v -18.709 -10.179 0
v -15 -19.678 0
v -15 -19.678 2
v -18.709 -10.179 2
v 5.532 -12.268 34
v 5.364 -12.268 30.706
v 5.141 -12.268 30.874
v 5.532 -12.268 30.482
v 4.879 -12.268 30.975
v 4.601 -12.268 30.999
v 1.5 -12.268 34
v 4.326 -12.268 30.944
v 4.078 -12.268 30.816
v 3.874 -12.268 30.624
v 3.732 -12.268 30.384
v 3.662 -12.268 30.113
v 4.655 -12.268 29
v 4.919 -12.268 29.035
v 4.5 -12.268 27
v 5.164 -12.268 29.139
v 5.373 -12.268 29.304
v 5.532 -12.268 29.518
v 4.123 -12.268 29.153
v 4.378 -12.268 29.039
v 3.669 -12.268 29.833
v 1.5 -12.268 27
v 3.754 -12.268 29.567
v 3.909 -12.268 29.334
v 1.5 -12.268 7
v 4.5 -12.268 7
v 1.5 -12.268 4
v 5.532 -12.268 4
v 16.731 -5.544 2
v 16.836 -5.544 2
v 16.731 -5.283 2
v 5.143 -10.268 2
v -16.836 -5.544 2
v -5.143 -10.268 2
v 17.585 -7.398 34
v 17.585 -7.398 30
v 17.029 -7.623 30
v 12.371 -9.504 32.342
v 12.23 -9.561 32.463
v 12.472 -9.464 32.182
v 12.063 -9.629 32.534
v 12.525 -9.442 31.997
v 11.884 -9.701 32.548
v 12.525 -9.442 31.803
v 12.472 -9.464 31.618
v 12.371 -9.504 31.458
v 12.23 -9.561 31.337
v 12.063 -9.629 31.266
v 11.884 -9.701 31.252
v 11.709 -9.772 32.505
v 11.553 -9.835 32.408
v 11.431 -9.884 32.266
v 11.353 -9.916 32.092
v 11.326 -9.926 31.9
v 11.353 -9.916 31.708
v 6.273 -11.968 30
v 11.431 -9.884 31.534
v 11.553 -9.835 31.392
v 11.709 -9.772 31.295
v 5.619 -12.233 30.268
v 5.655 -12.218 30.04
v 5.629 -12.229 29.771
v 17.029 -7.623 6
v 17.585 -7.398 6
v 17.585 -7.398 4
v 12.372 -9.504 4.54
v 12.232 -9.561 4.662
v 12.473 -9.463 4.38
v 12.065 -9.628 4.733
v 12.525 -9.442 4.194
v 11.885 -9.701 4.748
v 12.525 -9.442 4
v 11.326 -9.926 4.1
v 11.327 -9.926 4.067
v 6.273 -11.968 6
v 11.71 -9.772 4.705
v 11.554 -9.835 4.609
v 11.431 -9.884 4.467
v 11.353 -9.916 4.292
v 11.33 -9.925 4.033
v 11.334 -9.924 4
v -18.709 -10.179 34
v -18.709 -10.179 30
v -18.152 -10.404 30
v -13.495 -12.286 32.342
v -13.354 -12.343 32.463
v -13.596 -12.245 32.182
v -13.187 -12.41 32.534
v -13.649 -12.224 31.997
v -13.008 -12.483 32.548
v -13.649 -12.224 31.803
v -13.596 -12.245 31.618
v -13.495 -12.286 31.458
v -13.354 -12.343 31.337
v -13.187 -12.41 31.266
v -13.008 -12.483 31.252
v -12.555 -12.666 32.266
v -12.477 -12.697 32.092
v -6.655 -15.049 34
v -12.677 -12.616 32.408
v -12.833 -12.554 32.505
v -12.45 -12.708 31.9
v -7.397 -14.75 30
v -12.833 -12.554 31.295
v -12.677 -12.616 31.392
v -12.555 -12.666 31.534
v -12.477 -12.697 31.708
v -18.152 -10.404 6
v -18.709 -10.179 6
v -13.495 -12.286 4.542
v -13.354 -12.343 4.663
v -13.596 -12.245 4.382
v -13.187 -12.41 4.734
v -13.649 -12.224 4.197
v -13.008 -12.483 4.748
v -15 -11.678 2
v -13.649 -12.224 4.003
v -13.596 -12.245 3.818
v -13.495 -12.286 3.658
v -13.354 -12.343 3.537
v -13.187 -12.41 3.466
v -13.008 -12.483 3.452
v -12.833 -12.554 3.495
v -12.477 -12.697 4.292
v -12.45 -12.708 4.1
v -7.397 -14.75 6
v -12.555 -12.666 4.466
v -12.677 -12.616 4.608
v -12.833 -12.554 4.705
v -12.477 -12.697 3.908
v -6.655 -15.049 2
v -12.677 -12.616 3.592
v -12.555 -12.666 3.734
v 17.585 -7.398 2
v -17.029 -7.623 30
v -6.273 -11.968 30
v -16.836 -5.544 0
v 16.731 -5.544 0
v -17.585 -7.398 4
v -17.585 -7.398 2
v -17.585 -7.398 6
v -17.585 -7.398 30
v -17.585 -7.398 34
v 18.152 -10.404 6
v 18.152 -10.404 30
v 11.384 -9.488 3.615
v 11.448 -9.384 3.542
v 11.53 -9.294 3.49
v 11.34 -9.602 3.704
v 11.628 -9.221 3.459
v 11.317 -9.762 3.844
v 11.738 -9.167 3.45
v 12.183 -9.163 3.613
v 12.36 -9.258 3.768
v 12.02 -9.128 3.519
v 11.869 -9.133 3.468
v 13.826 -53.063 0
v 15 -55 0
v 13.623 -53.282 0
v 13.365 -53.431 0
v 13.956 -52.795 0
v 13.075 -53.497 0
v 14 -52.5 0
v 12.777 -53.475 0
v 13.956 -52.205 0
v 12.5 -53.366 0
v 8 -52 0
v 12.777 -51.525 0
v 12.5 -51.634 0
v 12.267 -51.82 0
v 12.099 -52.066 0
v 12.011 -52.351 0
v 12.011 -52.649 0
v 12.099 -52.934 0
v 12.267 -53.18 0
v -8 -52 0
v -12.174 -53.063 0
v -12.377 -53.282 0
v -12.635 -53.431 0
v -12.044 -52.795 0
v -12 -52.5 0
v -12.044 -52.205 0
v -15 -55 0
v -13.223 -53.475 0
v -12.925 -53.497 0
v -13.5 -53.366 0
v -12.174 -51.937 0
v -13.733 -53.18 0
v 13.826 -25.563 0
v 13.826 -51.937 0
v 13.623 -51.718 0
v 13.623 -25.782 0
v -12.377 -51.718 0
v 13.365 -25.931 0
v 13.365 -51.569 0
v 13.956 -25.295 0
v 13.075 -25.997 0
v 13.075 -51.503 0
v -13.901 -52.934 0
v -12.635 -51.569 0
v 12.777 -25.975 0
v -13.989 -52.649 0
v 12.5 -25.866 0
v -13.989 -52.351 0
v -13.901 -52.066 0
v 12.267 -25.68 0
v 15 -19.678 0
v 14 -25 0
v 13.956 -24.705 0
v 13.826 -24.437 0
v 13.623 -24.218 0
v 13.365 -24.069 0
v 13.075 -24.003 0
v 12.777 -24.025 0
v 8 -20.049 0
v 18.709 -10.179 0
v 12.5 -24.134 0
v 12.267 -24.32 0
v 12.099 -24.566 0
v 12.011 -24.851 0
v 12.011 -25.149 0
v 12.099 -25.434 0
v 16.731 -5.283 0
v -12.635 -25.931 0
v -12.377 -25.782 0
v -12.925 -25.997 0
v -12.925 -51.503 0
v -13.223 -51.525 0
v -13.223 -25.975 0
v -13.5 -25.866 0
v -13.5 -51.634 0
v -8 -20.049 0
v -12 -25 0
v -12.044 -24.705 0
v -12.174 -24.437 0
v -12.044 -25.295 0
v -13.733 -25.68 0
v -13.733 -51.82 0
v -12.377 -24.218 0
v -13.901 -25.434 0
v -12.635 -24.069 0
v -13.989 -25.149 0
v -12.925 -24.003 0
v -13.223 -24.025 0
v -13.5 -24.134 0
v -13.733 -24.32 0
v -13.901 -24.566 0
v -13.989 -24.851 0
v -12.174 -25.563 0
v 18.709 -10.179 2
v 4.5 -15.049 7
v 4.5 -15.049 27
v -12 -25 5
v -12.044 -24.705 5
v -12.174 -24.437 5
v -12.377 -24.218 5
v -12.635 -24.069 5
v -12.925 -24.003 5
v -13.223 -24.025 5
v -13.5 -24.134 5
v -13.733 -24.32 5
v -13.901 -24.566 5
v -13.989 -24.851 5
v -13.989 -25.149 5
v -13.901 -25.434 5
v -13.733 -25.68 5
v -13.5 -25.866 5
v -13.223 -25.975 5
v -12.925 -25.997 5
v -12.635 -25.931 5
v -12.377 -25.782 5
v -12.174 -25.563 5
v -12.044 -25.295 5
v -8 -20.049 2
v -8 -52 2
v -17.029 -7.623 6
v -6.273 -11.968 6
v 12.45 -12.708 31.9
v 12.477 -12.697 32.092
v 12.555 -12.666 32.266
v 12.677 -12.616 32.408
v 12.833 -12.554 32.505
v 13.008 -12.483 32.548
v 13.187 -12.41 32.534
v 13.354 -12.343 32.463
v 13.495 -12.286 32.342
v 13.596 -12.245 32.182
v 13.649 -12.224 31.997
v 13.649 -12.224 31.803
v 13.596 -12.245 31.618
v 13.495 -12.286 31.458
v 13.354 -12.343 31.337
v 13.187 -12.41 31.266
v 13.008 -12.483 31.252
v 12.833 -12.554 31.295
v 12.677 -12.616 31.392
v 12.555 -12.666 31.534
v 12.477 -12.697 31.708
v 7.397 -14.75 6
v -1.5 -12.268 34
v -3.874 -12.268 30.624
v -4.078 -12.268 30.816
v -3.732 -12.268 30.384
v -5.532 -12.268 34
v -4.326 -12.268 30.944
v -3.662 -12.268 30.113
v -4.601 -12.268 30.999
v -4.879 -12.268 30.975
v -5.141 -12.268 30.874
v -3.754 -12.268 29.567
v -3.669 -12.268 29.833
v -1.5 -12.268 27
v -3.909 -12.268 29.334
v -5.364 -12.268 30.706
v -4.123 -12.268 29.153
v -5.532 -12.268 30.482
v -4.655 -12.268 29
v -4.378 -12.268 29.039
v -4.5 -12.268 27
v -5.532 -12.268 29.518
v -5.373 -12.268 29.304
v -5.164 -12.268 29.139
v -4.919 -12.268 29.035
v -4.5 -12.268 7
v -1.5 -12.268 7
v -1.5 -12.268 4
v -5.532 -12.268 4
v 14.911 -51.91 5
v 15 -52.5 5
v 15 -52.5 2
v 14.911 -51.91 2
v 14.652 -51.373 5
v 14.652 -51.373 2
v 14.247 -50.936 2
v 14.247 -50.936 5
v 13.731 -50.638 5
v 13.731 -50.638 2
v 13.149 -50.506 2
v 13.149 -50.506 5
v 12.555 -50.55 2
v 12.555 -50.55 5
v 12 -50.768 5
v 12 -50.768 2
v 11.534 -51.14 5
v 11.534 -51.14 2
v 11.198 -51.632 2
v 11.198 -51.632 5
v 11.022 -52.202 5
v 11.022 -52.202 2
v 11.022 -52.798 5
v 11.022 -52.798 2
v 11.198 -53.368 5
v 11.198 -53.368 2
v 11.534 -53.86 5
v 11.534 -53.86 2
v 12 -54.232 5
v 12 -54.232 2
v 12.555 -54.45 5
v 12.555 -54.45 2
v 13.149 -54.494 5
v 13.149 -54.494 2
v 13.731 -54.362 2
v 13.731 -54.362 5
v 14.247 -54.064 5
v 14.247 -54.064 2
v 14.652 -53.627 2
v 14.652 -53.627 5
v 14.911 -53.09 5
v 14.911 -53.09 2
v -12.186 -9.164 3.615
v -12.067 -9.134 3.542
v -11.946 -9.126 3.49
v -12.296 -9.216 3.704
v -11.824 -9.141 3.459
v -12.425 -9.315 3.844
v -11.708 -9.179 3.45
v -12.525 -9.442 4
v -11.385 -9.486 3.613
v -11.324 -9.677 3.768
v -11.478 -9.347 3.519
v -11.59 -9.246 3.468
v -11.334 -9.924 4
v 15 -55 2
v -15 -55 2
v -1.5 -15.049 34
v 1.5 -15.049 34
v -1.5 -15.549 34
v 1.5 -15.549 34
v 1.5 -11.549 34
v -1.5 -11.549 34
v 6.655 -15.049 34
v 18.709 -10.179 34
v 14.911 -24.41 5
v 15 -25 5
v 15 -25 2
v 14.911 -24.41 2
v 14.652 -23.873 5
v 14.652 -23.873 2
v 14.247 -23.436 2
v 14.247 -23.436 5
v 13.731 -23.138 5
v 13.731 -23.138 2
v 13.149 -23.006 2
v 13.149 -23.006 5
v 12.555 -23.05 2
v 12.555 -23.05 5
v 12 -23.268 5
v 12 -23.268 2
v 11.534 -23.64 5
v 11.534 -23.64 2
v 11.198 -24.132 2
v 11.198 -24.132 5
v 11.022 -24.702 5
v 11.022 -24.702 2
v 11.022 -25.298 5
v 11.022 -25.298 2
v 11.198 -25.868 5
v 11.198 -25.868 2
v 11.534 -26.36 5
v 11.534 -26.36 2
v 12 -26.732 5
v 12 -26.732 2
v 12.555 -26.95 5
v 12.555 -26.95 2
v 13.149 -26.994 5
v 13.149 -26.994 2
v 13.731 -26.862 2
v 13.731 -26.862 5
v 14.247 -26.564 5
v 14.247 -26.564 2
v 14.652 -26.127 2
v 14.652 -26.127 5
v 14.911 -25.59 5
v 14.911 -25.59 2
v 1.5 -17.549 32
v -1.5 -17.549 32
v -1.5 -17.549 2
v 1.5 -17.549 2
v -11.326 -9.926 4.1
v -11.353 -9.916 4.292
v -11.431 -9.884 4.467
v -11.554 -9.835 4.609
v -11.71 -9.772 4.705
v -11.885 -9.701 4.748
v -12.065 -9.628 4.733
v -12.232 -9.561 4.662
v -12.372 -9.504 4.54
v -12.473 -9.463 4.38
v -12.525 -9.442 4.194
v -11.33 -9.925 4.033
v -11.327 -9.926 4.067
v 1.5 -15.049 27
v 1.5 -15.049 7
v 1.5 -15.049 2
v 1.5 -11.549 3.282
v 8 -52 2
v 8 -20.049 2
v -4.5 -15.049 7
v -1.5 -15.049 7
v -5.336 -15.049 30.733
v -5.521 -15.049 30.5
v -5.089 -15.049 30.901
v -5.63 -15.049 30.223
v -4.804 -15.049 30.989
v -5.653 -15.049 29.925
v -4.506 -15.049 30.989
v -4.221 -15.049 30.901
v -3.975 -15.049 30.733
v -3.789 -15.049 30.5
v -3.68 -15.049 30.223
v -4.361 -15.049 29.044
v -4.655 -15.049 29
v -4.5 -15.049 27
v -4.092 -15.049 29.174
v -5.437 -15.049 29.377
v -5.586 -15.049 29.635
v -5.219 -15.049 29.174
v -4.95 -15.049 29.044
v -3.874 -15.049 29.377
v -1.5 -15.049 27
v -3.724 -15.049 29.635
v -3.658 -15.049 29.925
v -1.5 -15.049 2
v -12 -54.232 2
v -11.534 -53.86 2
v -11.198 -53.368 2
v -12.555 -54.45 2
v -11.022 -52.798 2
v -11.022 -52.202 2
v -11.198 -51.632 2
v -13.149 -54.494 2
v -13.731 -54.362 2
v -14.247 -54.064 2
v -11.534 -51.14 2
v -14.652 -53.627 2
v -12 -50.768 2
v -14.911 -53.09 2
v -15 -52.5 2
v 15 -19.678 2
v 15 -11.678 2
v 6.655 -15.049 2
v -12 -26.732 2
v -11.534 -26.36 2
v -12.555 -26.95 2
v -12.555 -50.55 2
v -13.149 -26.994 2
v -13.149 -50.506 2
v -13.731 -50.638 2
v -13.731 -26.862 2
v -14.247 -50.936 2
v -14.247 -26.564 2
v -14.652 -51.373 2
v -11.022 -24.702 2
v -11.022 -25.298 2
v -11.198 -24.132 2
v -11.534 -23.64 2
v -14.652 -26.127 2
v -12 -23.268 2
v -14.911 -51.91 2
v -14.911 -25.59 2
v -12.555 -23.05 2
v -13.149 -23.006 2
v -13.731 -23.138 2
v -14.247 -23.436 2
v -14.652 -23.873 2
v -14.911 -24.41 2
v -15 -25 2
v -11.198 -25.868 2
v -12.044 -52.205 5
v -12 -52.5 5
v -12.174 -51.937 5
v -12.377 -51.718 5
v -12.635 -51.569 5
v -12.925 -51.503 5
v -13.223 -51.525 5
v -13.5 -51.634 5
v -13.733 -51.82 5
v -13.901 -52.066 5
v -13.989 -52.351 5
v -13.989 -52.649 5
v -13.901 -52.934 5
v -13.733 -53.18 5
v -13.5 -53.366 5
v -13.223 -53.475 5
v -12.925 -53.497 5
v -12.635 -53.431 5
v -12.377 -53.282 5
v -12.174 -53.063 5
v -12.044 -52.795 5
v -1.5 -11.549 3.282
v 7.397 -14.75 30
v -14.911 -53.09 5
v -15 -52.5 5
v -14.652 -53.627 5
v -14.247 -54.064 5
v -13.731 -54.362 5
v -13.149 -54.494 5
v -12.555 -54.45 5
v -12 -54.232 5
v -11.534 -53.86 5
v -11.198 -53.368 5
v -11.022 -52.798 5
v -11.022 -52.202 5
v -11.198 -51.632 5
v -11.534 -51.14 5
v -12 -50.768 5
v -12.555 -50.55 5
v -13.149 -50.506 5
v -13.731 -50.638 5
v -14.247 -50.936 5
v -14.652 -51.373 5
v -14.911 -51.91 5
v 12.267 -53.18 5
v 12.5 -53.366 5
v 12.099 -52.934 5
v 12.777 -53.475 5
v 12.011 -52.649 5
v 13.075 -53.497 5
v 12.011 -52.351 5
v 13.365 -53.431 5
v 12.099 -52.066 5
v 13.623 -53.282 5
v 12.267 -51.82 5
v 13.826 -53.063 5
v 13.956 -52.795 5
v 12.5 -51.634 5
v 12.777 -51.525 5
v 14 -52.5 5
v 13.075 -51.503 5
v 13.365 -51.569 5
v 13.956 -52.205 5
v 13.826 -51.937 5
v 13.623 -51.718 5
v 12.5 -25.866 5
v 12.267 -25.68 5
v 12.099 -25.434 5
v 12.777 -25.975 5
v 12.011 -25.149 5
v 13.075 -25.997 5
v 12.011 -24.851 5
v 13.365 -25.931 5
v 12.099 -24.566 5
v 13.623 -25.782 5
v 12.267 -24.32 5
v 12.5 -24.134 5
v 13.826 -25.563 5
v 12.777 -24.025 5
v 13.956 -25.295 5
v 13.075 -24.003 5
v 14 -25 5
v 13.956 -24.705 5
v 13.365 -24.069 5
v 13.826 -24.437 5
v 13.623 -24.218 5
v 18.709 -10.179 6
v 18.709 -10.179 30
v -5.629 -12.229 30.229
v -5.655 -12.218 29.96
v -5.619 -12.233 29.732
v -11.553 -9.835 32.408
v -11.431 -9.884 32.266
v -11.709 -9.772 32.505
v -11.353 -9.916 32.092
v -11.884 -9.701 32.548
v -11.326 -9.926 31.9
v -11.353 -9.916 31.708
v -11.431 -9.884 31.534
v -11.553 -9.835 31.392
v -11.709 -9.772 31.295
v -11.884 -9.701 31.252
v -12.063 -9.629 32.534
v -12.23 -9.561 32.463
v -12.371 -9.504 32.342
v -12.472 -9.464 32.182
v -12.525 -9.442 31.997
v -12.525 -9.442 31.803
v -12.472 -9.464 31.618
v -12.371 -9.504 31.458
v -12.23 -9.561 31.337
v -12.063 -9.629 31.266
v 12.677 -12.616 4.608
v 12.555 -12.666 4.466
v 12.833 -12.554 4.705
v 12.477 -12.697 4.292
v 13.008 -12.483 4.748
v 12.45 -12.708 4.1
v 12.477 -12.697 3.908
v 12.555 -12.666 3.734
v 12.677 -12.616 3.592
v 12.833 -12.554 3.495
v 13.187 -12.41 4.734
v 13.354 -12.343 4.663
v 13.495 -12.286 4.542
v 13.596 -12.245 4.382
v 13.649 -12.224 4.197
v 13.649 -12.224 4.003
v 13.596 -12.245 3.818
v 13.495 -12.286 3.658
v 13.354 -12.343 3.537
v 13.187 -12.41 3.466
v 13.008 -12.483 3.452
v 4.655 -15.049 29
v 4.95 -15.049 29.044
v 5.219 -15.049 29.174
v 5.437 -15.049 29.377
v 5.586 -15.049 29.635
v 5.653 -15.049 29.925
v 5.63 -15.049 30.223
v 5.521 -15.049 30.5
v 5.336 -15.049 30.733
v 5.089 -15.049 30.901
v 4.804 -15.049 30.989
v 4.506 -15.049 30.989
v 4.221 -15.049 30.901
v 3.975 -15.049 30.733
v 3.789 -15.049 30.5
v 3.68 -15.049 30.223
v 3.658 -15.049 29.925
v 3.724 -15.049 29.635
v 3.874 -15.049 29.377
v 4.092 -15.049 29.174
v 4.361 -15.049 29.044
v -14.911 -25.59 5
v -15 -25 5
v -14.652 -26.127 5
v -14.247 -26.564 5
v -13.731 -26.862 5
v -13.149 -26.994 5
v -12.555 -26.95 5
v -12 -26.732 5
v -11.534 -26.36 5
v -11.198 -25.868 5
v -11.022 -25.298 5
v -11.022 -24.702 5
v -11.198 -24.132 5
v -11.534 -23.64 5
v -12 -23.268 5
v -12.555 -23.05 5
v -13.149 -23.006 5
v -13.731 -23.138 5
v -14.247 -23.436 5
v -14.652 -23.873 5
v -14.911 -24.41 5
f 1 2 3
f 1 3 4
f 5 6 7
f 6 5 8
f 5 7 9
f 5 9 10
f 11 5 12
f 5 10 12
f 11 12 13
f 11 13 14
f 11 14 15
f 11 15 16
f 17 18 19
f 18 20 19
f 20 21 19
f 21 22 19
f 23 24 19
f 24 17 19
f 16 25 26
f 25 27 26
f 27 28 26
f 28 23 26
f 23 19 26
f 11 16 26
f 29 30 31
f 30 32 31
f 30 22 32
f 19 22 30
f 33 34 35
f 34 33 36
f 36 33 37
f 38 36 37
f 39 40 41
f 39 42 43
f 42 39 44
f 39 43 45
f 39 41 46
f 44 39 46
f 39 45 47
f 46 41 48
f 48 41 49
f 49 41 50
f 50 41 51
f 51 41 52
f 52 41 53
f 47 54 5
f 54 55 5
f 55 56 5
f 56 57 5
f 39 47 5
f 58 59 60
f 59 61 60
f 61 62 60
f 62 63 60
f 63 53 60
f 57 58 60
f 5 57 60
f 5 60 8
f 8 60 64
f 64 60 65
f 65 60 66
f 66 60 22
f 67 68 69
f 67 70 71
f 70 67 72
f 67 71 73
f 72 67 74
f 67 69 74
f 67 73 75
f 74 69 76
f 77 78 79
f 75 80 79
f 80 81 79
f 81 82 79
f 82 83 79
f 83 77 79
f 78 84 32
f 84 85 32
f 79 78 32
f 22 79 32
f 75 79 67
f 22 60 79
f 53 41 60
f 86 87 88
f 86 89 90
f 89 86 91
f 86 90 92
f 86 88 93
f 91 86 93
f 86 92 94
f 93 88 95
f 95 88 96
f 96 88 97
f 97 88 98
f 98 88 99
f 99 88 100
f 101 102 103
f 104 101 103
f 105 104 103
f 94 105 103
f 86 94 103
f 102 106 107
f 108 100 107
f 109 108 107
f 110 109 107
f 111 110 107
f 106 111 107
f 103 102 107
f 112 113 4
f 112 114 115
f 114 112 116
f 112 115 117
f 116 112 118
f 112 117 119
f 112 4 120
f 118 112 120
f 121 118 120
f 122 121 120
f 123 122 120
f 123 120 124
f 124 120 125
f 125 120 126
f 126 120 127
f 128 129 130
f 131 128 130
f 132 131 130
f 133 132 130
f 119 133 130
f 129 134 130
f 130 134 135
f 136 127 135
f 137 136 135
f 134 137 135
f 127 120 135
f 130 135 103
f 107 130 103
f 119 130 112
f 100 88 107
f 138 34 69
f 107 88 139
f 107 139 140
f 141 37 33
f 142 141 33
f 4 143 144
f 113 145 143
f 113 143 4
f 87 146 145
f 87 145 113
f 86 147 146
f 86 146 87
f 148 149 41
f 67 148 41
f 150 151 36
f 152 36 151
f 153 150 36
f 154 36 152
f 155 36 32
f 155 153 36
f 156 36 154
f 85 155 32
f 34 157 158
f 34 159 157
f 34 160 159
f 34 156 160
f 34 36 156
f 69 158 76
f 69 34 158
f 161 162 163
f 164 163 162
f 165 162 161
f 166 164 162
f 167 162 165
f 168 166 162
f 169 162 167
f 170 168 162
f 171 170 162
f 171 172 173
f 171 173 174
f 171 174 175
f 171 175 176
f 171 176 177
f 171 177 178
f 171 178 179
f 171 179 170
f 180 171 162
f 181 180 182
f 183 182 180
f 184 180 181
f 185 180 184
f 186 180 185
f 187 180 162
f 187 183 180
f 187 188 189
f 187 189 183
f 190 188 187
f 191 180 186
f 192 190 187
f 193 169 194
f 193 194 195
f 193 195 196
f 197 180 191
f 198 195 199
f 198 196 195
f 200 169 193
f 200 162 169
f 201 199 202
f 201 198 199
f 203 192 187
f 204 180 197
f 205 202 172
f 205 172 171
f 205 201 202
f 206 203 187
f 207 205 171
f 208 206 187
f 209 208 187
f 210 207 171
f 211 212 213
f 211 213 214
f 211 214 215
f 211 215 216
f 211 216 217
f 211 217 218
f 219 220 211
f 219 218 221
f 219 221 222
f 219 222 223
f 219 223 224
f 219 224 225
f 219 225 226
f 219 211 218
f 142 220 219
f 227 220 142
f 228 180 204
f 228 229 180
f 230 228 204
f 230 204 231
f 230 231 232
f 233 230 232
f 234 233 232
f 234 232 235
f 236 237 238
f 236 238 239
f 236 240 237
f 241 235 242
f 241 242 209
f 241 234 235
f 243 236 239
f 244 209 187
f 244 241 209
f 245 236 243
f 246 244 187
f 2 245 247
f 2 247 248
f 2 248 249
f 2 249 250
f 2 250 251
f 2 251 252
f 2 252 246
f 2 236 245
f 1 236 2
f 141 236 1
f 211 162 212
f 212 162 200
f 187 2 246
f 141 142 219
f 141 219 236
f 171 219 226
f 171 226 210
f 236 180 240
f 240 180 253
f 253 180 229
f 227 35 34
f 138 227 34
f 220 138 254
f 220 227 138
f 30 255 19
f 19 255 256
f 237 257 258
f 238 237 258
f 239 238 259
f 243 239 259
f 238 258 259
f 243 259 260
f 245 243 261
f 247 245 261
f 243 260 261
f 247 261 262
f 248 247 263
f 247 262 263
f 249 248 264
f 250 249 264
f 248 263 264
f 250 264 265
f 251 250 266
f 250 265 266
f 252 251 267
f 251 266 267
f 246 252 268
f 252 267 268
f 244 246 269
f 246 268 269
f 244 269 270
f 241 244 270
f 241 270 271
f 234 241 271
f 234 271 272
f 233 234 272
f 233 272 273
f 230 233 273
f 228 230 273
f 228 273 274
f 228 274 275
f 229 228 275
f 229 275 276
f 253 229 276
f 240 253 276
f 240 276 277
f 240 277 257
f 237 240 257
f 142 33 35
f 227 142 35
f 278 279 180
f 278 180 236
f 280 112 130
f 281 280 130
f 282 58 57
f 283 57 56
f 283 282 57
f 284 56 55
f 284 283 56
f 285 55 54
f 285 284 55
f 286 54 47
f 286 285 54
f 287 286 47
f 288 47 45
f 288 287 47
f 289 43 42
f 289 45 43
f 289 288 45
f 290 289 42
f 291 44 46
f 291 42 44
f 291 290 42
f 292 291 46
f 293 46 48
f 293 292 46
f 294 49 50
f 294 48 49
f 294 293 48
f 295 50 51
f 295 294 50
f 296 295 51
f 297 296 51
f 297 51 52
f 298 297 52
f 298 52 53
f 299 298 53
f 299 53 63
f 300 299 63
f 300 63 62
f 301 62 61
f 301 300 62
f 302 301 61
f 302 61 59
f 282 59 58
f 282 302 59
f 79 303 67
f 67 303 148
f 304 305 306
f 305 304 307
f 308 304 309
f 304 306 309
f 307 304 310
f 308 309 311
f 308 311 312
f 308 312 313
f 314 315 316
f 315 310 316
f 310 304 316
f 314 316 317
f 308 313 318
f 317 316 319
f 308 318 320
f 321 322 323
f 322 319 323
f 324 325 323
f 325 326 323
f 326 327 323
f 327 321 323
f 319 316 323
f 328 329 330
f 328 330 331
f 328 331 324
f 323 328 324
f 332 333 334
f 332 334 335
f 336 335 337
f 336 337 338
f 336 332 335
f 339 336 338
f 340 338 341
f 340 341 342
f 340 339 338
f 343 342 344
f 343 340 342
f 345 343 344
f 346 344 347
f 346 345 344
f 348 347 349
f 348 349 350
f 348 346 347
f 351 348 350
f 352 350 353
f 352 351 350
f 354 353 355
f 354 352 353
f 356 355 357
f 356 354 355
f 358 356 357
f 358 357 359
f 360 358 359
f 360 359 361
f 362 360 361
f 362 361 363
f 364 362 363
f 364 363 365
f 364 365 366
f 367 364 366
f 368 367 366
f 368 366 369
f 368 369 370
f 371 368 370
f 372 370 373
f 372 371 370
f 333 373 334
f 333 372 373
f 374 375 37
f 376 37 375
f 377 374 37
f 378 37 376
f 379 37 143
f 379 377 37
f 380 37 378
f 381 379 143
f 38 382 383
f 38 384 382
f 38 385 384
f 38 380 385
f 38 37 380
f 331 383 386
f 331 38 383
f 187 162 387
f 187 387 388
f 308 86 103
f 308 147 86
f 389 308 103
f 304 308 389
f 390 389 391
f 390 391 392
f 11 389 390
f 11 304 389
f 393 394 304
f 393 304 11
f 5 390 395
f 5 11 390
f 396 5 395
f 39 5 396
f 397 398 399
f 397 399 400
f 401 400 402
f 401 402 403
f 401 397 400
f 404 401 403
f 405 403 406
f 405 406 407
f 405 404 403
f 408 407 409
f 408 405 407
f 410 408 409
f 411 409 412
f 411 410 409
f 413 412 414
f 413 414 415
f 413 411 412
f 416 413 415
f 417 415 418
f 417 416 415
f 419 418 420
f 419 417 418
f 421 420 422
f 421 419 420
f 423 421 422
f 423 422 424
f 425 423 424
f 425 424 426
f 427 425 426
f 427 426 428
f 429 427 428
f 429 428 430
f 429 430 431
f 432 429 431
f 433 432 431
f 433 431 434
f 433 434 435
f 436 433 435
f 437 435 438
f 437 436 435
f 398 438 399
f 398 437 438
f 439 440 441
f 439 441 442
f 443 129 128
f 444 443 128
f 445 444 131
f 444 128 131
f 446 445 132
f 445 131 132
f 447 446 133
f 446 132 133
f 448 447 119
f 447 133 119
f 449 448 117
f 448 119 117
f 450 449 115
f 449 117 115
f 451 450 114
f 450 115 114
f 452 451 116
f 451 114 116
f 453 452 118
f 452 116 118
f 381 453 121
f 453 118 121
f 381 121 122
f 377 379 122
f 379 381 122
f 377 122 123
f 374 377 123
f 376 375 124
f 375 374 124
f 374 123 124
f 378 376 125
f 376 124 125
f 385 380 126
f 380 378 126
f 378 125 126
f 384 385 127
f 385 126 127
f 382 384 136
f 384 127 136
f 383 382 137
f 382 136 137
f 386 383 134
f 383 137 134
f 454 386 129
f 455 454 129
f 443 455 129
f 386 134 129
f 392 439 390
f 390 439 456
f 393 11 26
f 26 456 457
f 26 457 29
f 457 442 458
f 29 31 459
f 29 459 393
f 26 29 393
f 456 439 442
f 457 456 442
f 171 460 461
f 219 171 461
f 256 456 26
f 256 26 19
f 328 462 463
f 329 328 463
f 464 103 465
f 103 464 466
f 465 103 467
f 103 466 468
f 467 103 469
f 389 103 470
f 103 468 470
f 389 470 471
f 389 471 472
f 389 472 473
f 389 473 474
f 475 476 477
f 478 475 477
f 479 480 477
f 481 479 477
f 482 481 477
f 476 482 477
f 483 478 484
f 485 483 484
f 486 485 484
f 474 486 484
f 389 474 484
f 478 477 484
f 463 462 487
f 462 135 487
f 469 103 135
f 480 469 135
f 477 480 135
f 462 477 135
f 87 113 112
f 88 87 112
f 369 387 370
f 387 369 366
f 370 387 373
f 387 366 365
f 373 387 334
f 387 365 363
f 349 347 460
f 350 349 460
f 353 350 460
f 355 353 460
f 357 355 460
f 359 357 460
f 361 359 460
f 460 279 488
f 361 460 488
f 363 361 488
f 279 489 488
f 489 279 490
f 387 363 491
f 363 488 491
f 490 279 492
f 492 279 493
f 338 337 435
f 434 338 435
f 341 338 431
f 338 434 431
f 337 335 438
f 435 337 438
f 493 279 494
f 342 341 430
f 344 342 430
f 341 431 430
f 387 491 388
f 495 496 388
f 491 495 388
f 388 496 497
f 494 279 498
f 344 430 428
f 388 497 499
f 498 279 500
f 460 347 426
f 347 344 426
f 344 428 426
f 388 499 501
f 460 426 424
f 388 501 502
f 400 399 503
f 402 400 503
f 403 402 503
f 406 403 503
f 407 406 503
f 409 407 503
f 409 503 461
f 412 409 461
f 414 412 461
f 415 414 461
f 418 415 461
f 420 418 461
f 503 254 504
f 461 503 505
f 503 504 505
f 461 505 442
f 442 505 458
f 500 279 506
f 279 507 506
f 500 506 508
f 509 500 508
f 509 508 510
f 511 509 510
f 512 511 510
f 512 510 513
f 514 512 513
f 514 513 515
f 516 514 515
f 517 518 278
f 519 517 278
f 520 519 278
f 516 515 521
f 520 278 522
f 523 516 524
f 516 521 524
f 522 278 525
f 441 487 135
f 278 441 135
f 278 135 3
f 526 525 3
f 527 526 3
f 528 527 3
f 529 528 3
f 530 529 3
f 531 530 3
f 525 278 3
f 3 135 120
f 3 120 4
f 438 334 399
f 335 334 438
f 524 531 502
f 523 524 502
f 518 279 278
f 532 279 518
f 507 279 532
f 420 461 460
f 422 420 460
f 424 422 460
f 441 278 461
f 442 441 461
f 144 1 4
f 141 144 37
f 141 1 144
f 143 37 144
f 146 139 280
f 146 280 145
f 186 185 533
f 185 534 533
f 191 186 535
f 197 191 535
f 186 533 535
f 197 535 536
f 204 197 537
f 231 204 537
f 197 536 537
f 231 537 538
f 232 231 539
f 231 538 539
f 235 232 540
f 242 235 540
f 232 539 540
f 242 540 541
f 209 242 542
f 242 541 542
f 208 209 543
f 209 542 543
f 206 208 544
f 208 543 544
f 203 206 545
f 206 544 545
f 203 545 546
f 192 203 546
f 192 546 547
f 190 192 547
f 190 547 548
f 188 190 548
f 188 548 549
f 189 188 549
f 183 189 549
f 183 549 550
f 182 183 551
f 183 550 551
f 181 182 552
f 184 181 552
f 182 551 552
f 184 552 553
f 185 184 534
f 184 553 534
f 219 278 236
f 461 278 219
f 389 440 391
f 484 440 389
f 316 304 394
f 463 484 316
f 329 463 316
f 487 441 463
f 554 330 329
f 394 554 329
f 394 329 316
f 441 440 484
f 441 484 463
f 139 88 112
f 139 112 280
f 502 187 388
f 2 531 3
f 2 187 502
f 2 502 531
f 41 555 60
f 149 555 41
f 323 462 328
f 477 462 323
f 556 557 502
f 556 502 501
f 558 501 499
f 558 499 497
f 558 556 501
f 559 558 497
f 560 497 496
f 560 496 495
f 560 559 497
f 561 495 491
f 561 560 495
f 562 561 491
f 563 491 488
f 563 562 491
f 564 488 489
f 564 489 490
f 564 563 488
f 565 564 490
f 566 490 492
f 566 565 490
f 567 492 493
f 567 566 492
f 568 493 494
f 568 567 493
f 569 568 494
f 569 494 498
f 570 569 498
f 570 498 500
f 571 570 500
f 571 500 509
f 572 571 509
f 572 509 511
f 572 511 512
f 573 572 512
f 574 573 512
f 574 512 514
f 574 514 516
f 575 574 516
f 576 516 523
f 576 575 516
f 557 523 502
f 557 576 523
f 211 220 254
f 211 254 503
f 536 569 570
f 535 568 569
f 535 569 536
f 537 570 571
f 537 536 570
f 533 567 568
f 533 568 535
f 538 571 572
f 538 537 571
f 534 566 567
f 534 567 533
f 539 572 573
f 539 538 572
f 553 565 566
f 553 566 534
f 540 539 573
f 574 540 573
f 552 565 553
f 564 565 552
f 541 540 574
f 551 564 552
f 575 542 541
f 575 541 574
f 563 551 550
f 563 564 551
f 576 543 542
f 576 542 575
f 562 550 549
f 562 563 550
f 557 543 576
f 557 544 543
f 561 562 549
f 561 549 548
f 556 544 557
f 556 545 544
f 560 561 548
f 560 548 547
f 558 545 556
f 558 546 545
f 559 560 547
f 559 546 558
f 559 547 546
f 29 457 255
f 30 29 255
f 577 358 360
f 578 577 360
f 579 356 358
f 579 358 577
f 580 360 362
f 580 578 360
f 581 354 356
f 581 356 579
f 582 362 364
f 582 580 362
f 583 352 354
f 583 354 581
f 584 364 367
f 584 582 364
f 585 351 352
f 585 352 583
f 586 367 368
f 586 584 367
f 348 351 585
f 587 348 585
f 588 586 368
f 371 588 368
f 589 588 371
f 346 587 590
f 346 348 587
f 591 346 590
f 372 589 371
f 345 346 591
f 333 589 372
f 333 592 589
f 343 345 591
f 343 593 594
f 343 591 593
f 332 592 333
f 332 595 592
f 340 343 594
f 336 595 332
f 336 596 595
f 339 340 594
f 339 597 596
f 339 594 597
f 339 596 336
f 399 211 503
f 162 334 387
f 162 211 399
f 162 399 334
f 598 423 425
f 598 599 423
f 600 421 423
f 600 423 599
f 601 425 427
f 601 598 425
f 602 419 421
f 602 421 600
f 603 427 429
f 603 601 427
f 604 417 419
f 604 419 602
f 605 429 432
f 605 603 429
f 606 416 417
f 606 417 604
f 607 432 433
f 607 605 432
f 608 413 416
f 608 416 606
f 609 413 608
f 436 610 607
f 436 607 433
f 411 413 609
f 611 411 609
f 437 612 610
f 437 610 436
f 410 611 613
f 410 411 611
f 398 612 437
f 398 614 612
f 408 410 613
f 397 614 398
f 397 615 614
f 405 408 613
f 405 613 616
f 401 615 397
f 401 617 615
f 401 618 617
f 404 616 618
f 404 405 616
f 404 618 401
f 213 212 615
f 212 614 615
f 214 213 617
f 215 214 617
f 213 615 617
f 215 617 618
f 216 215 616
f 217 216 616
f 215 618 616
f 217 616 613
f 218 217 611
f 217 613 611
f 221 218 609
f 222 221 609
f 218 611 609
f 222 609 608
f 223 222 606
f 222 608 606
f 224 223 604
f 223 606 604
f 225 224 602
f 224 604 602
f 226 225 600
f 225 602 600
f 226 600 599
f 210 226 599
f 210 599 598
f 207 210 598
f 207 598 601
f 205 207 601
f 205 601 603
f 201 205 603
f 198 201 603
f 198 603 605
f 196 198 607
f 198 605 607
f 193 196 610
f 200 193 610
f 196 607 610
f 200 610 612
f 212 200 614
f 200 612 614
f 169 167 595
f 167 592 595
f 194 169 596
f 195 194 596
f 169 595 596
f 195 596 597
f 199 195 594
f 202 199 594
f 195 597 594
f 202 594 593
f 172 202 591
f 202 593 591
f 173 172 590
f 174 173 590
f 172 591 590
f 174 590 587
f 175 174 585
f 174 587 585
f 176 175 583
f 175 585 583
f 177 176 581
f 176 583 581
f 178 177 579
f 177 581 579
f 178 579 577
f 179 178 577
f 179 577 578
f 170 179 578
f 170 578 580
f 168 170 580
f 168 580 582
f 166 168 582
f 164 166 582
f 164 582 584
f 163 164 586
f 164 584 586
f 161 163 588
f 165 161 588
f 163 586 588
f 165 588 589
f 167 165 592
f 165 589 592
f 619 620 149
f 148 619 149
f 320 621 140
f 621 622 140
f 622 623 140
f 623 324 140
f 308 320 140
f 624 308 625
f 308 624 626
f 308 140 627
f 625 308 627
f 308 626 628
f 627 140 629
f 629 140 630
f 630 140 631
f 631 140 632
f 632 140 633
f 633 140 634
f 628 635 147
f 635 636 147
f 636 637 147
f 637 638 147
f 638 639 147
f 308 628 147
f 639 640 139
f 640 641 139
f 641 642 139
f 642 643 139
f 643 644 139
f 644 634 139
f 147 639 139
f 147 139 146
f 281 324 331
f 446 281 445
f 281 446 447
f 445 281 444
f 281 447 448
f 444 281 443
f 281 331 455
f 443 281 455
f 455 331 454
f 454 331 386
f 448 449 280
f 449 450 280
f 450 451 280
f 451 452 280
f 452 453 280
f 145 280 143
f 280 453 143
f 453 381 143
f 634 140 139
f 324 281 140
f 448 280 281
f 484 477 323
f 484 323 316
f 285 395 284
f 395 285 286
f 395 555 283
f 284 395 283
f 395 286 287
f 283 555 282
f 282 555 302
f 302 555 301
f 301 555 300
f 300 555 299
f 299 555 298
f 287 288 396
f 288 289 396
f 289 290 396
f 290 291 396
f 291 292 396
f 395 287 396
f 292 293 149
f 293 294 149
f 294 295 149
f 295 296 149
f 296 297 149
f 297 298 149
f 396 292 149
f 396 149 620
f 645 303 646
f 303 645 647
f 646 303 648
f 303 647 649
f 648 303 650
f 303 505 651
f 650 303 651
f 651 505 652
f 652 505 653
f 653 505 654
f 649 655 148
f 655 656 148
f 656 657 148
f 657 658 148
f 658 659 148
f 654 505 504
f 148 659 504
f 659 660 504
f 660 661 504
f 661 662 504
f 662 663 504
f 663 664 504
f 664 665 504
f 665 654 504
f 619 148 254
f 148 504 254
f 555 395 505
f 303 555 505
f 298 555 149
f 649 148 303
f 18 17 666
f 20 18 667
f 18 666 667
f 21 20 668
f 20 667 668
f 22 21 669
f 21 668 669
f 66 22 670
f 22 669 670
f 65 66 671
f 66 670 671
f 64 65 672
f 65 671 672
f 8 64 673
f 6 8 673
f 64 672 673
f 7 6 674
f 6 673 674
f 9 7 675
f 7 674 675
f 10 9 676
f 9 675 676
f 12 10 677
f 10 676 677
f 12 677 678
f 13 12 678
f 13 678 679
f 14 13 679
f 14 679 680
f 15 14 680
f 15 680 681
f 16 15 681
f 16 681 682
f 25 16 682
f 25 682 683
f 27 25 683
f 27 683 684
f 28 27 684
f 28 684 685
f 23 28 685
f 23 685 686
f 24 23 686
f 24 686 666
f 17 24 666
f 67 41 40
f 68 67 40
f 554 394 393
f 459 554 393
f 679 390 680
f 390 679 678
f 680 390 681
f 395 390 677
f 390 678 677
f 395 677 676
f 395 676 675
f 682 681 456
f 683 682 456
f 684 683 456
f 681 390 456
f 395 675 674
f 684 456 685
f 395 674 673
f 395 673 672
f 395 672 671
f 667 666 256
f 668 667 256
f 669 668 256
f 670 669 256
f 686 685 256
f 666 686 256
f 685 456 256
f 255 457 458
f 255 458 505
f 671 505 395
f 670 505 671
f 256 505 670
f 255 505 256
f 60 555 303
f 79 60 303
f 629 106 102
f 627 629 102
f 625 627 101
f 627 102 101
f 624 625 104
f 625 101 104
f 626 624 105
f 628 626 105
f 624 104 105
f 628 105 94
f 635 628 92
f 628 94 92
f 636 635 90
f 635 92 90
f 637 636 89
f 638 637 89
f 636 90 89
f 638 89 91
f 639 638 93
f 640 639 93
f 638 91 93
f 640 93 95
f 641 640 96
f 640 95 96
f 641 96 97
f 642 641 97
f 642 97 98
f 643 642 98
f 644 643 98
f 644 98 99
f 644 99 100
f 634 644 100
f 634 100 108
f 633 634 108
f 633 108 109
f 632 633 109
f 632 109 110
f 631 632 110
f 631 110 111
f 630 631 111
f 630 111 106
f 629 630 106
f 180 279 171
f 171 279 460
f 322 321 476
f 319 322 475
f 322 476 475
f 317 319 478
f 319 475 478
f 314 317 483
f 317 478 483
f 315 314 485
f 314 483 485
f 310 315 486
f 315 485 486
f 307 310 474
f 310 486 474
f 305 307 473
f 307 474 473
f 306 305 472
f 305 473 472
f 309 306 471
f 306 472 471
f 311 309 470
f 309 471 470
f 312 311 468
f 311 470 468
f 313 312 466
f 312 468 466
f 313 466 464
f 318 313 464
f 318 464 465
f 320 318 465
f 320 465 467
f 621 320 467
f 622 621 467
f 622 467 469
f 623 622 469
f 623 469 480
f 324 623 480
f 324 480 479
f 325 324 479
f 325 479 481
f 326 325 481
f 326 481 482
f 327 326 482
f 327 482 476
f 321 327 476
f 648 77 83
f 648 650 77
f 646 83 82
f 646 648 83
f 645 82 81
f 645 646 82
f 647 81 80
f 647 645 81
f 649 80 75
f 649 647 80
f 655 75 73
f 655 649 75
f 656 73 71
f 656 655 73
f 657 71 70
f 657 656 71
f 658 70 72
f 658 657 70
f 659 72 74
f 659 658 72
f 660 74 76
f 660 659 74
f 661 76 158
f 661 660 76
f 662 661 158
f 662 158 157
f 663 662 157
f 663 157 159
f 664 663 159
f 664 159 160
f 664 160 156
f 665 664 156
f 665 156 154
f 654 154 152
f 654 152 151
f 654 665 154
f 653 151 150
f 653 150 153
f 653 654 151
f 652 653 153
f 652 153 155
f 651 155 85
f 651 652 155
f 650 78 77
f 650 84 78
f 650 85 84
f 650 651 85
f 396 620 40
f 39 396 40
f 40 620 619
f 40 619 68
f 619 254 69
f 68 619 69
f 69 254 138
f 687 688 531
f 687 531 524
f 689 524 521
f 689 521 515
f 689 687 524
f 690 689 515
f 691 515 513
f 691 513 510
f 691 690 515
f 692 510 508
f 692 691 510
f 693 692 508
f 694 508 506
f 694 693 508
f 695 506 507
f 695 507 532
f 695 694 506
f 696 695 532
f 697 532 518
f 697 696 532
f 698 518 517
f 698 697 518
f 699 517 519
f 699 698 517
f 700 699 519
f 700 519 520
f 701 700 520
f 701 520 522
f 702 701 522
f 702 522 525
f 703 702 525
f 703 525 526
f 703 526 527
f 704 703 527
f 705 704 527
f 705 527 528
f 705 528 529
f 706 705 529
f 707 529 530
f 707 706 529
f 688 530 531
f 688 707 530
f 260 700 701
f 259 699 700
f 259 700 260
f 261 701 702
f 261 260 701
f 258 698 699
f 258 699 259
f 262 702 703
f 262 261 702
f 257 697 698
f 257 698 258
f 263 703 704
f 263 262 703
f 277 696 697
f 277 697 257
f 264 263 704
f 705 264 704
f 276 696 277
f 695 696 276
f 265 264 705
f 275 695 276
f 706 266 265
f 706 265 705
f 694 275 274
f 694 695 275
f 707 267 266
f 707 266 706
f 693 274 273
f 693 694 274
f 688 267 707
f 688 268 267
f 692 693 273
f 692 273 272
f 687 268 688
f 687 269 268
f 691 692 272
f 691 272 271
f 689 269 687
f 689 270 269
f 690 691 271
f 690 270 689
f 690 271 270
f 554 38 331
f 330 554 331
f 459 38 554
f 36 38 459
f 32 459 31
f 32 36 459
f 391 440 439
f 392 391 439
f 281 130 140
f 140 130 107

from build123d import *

# Parameters (mm, degrees)
EXTRUDE_1_DEPTH      = 2
EXTRUDE_2_DEPTH      = 32
EXTRUDE_2_DEPTH_BACK = 2
CUT_EXTRUDE_5_REACH  = 59.048
SKETCH_3_R           = 0.65
SKETCH_3_W           = 12.2
SKETCH_3_H           = 24
CUT_EXTRUDE_7_REACH  = 59.919
SKETCH_12_R          = 0.65
SKETCH_12_W          = 12.2
SKETCH_12_H          = 24
CUT_EXTRUDE_8_REACH  = 68.325
SKETCH_13_R          = 1
SKETCH_13_W          = 16
SKETCH_13_H          = 31.950672009
CHAMFER_4_SIZE       = 1
CHAMFER_5_SIZE       = 2
EXTRUDE_START        = -32
SKETCH_14_W          = 3
SKETCH_14_H          = 6
EXTRUDE_8_DEPTH      = 32
CHAMFER_6_SIZE       = 2
EXTRUDE_START_2      = 3
SKETCH_15_R          = 2
SKETCH_15_R_2        = 1
EXTRUDE_9_DEPTH      = 3
CUT_EXTRUDE_9_REACH  = 57.696
SKETCH_16_W          = 3
SKETCH_16_H          = 20
EXTRUDE_10_DEPTH     = 2
EXTRUDE_11_DEPTH     = 28
CUT_EXTRUDE_10_REACH = 55.931
SKETCH_19_R          = 1
CUT_EXTRUDE_11_REACH = 68.325
SKETCH_20_W          = 33.566306147
SKETCH_20_H          = 6.687524296


# Some blends are built 0.0001 mm under size
with BuildPart() as part:
    # 草圖1 → 填料-伸長1 (new body)
    with BuildSketch(Plane.XY):
        Polygon((-15, 0), (15, 0), (15, -1), (18.708735418, -10.179442277), (15, -11.67786865), (15, -55), (-15, -55), (-15, -11.67786865), (-18.708735418, -10.179442277), (-15, -1), align=None)
    extrude(amount=EXTRUDE_1_DEPTH)

    # 草圖2 → 填料-伸長2 (add, two sides: drawn at the far end of the back side and taken through both)
    with BuildSketch(Plane.XY.offset(2).offset(-EXTRUDE_2_DEPTH_BACK)):
        Polygon((-18.708735418, -10.179442277), (-6.655345309, -15.049327991), (6.655345309, -15.049327991), (18.708735418, -10.179442277), (17.584915638, -7.397890713), (5.531525529, -12.267776427), (-5.531525529, -12.267776427), (-17.584915638, -7.397890713), align=None)
    extrude(amount=EXTRUDE_2_DEPTH + EXTRUDE_2_DEPTH_BACK)

    # 草圖3 → 除料-伸長5 (cut, up to next)
    with BuildSketch(Plane(origin=(4.914686172, -15.752599933, 0), x_dir=(0.9271838545667884, 0.37460659341590963, 0), z_dir=(-0.37460659341590963, 0.9271838545667884, 0)), mode=Mode.PRIVATE) as cut_extrude_5_sk1:
        with Locations(Location((8.777361354, -4.1, 0), (0, 0, 180))):
            Circle(SKETCH_3_R)
    cut_extrude_5_tool1 = extrude(cut_extrude_5_sk1.sketch, amount=CUT_EXTRUDE_5_REACH, mode=Mode.PRIVATE) & part.part
    # 草圖3 → 除料-伸長5 (cut, up to next)
    with BuildSketch(Plane(origin=(4.914686172, -15.752599933, 0), x_dir=(0.9271838545667884, 0.37460659341590963, 0), z_dir=(-0.37460659341590963, 0.9271838545667884, 0)), mode=Mode.PRIVATE) as cut_extrude_5_sk2:
        with Locations(Location((8.777361354, -31.9, 0), (0, 0, 180))):
            Circle(SKETCH_3_R)
    cut_extrude_5_tool2 = extrude(cut_extrude_5_sk2.sketch, amount=CUT_EXTRUDE_5_REACH, mode=Mode.PRIVATE) & part.part
    # 草圖3 → 除料-伸長5 (cut, up to next)
    with BuildSketch(Plane(origin=(4.914686172, -15.752599933, 0), x_dir=(0.9271838545667884, 0.37460659341590963, 0), z_dir=(-0.37460659341590963, 0.9271838545667884, 0)), mode=Mode.PRIVATE) as cut_extrude_5_sk3:
        with Locations((8.777361354, -18)):
            Rectangle(SKETCH_3_W, SKETCH_3_H)
    cut_extrude_5_tool3 = extrude(cut_extrude_5_sk3.sketch, amount=CUT_EXTRUDE_5_REACH, mode=Mode.PRIVATE) & part.part
    add(cut_extrude_5_tool1.solids().sort_by_distance((13.052914, -12.464542, 4.1))[0], mode=Mode.SUBTRACT)
    add(cut_extrude_5_tool2.solids().sort_by_distance((13.052914, -12.464542, 31.9))[0], mode=Mode.SUBTRACT)
    add(cut_extrude_5_tool3.solids().sort_by_distance((13.052914, -12.464542, 18))[0], mode=Mode.SUBTRACT)

    # 草圖12 → 除料-伸長7 (cut, up to next)
    with BuildSketch(Plane(origin=(-6.161016101, -15.249049955, 0), x_dir=(0.9271838545667846, -0.3746065934159192, 0), z_dir=(-0.3746065934159192, -0.9271838545667846, 0)), mode=Mode.PRIVATE) as cut_extrude_7_sk1:
        with Locations((-7.433151225, 31.9)):
            Circle(SKETCH_12_R)
    cut_extrude_7_tool1 = extrude(cut_extrude_7_sk1.sketch, amount=-CUT_EXTRUDE_7_REACH, mode=Mode.PRIVATE) & part.part
    # 草圖12 → 除料-伸長7 (cut, up to next)
    with BuildSketch(Plane(origin=(-6.161016101, -15.249049955, 0), x_dir=(0.9271838545667846, -0.3746065934159192, 0), z_dir=(-0.3746065934159192, -0.9271838545667846, 0)), mode=Mode.PRIVATE) as cut_extrude_7_sk2:
        with Locations((-7.433151225, 4.1)):
            Circle(SKETCH_12_R)
    cut_extrude_7_tool2 = extrude(cut_extrude_7_sk2.sketch, amount=-CUT_EXTRUDE_7_REACH, mode=Mode.PRIVATE) & part.part
    # 草圖12 → 除料-伸長7 (cut, up to next)
    with BuildSketch(Plane(origin=(-6.161016101, -15.249049955, 0), x_dir=(0.9271838545667846, -0.3746065934159192, 0), z_dir=(-0.3746065934159192, -0.9271838545667846, 0)), mode=Mode.PRIVATE) as cut_extrude_7_sk3:
        with Locations((-7.433151225, 18)):
            Rectangle(SKETCH_12_W, SKETCH_12_H)
    cut_extrude_7_tool3 = extrude(cut_extrude_7_sk3.sketch, amount=-CUT_EXTRUDE_7_REACH, mode=Mode.PRIVATE) & part.part
    add(cut_extrude_7_tool1.solids().sort_by_distance((-13.052914, -12.464542, 31.9))[0], mode=Mode.SUBTRACT)
    add(cut_extrude_7_tool2.solids().sort_by_distance((-13.052914, -12.464542, 4.1))[0], mode=Mode.SUBTRACT)
    add(cut_extrude_7_tool3.solids().sort_by_distance((-13.052914, -12.464542, 18))[0], mode=Mode.SUBTRACT)

    # 草圖13 → 除料-伸長8 (cut, up to next)
    with BuildSketch(Plane.XY.offset(2), mode=Mode.PRIVATE) as cut_extrude_8_sk1:
        with Locations((-13, -25)):
            Circle(SKETCH_13_R)
    cut_extrude_8_tool1 = extrude(cut_extrude_8_sk1.sketch, amount=-CUT_EXTRUDE_8_REACH, mode=Mode.PRIVATE) & part.part
    # 草圖13 → 除料-伸長8 (cut, up to next)
    with BuildSketch(Plane.XY.offset(2), mode=Mode.PRIVATE) as cut_extrude_8_sk2:
        with Locations((13, -25)):
            Circle(SKETCH_13_R)
    cut_extrude_8_tool2 = extrude(cut_extrude_8_sk2.sketch, amount=-CUT_EXTRUDE_8_REACH, mode=Mode.PRIVATE) & part.part
    # 草圖13 → 除料-伸長8 (cut, up to next)
    with BuildSketch(Plane.XY.offset(2), mode=Mode.PRIVATE) as cut_extrude_8_sk3:
        with Locations((-13, -52.5)):
            Circle(SKETCH_13_R)
    cut_extrude_8_tool3 = extrude(cut_extrude_8_sk3.sketch, amount=-CUT_EXTRUDE_8_REACH, mode=Mode.PRIVATE) & part.part
    # 草圖13 → 除料-伸長8 (cut, up to next)
    with BuildSketch(Plane.XY.offset(2), mode=Mode.PRIVATE) as cut_extrude_8_sk4:
        with Locations((13, -52.5)):
            Circle(SKETCH_13_R)
    cut_extrude_8_tool4 = extrude(cut_extrude_8_sk4.sketch, amount=-CUT_EXTRUDE_8_REACH, mode=Mode.PRIVATE) & part.part
    # 草圖13 → 除料-伸長8 (cut, up to next)
    with BuildSketch(Plane.XY.offset(2), mode=Mode.PRIVATE) as cut_extrude_8_sk5:
        with Locations((0, -36.024663995)):
            Rectangle(SKETCH_13_W, SKETCH_13_H)
    cut_extrude_8_tool5 = extrude(cut_extrude_8_sk5.sketch, amount=-CUT_EXTRUDE_8_REACH, mode=Mode.PRIVATE) & part.part
    add(cut_extrude_8_tool1.solids().sort_by_distance((-13, -25, 2))[0], mode=Mode.SUBTRACT)
    add(cut_extrude_8_tool2.solids().sort_by_distance((13, -25, 2))[0], mode=Mode.SUBTRACT)
    add(cut_extrude_8_tool3.solids().sort_by_distance((-13, -52.5, 2))[0], mode=Mode.SUBTRACT)
    add(cut_extrude_8_tool4.solids().sort_by_distance((13, -52.5, 2))[0], mode=Mode.SUBTRACT)
    add(cut_extrude_8_tool5.solids().sort_by_distance((0, -36.024664, 2))[0], mode=Mode.SUBTRACT)

    # 導角4
    chamfer_4_edges = [part.edges().sort_by_distance(p)[0] for p in [
        (-15, 0, 1),
        (15, 0, 1),
    ]]
    chamfer(chamfer_4_edges, length=CHAMFER_4_SIZE - 0.0001)  # a hair under: the kernel refuses the full size

    # 導角5
    # the kernel refuses this chamfer: 2 mm, written as the material it adds along each edge
    with BuildSketch(Plane(origin=(-0.762679638, -14.194515234, 2), x_dir=(0.374464960998025, 0.9268333020312569, -0.02749587661058639), z_dir=(-0.9271838545667873, 0.37460659341591224, 0))) as chamfer_5_piece_1_section:
        Polygon((CHAMFER_5_SIZE * 0.999621916911, -CHAMFER_5_SIZE * 0.0274958766106), (-CHAMFER_5_SIZE * 0.0274958766106, -CHAMFER_5_SIZE * 0.999621916911), (0, 0), align=None)
    chamfer_5_piece_1 = extrude(amount=18.143365976, mode=Mode.PRIVATE)
    chamfer_5_piece_1 = chamfer_5_piece_1 - Plane(origin=(-11.749090567, -9.237466492, 4.1), x_dir=(0.9271838545667846, -0.3746065934159192, 0), z_dir=(-0.3746065934159192, -0.9271838545667846, 0)) * Cylinder(0.65, 45, mode=Mode.PRIVATE)
    add(chamfer_5_piece_1)
    with BuildSketch(Plane(origin=(10.674891505, -12.267776427, 2), x_dir=(0, 0.9996219169112968, -0.027495876610586355), z_dir=(-1, 0, 0))) as chamfer_5_piece_2:
        Polygon((CHAMFER_5_SIZE * 0.999621916911, -CHAMFER_5_SIZE * 0.0274958766106), (-CHAMFER_5_SIZE * 0.0274958766106, -CHAMFER_5_SIZE * 0.999621916911), (0, 0), align=None)
    extrude(amount=21.349783009)
    with BuildSketch(Plane(origin=(17.584915638, -7.397890713, 2), x_dir=(-0.37446496099802423, 0.926833302031257, -0.027495876610586365), z_dir=(-0.9271838545667876, -0.3746065934159116, 0))) as chamfer_5_piece_3_section:
        Polygon((CHAMFER_5_SIZE * 0.999621916911, -CHAMFER_5_SIZE * 0.0274958766106), (-CHAMFER_5_SIZE * 0.0274958766106, -CHAMFER_5_SIZE * 0.999621916911), (0, 0), align=None)
    chamfer_5_piece_3 = extrude(amount=18.143365976, mode=Mode.PRIVATE)
    chamfer_5_piece_3 = chamfer_5_piece_3 - Plane(origin=(11.664740132, -9.02869184, 4.1), x_dir=(-0.9271838545667884, -0.37460659341590963, 0), z_dir=(0.37460659341590963, -0.9271838545667884, 0)) * Cylinder(0.65, 45, mode=Mode.PRIVATE)
    add(chamfer_5_piece_3)

    # 草圖14 → 填料-伸長8 (add)
    with BuildSketch(Plane.XY.offset(34).offset(EXTRUDE_START)):
        with Locations((0, -14.549327991)):
            Rectangle(SKETCH_14_W, SKETCH_14_H)
    extrude(amount=EXTRUDE_8_DEPTH)

    # 導角6
    chamfer_6_edges = [part.edges().sort_by_distance(p)[0] for p in [
        (0, -17.549327991, 34),
    ]]
    chamfer(chamfer_6_edges, length=CHAMFER_6_SIZE)

    # 草圖15 → 填料-伸長9 (add)
    # profile 1 of 4: a face of its own
    with BuildSketch(Plane.XY.offset(2).offset(EXTRUDE_START_2)):
        with Locations(Location((-13, -25, 0), (0, 0, 180))):
            Circle(SKETCH_15_R)
        with Locations((-13, -25)):
            Circle(SKETCH_15_R_2, mode=Mode.SUBTRACT)
    # profile 2 of 4: a face of its own
    with BuildSketch(Plane.XY.offset(2).offset(EXTRUDE_START_2)):
        with Locations((13, -25)):
            Circle(SKETCH_15_R)
        with Locations((13, -25)):
            Circle(SKETCH_15_R_2, mode=Mode.SUBTRACT)
    # profile 3 of 4: a face of its own
    with BuildSketch(Plane.XY.offset(2).offset(EXTRUDE_START_2)):
        with Locations((13, -52.5)):
            Circle(SKETCH_15_R)
        with Locations((13, -52.5)):
            Circle(SKETCH_15_R_2, mode=Mode.SUBTRACT)
    # profile 4 of 4: a face of its own
    with BuildSketch(Plane.XY.offset(2).offset(EXTRUDE_START_2)):
        with Locations(Location((-13, -52.5, 0), (0, 0, 180))):
            Circle(SKETCH_15_R)
        with Locations((-13, -52.5)):
            Circle(SKETCH_15_R_2, mode=Mode.SUBTRACT)
    extrude(amount=-EXTRUDE_9_DEPTH)

    # 草圖16 → 除料-伸長9 (cut, up to next)
    with BuildSketch(Plane.XZ.offset(15.049327991), mode=Mode.PRIVATE) as cut_extrude_9_sk1:
        with Locations((-3, 17)):
            Rectangle(SKETCH_16_W, SKETCH_16_H)
    cut_extrude_9_tool1 = extrude(cut_extrude_9_sk1.sketch, amount=-CUT_EXTRUDE_9_REACH, mode=Mode.PRIVATE) & part.part
    # 草圖16 → 除料-伸長9 (cut, up to next)
    with BuildSketch(Plane.XZ.offset(15.049327991), mode=Mode.PRIVATE) as cut_extrude_9_sk2:
        with Locations((3, 17)):
            Rectangle(SKETCH_16_W, SKETCH_16_H)
    cut_extrude_9_tool2 = extrude(cut_extrude_9_sk2.sketch, amount=-CUT_EXTRUDE_9_REACH, mode=Mode.PRIVATE) & part.part
    add(cut_extrude_9_tool1.solids().sort_by_distance((-3, -15.049328, 17))[0], mode=Mode.SUBTRACT)
    add(cut_extrude_9_tool2.solids().sort_by_distance((3, -15.049328, 17))[0], mode=Mode.SUBTRACT)

    # 草圖17 → 填料-伸長10 (add)
    with BuildSketch(Plane(origin=(0, 0, 0), x_dir=(-1, 0, 0), z_dir=(0, 0, -1))):
        Polygon((-18.708735418, -10.179442277), (-15, -19.67786865), (-15, -11.67786865), align=None)
        Polygon((18.708735418, -10.179442277), (15, -11.67786865), (15, -19.67786865), align=None)
    extrude(amount=-EXTRUDE_10_DEPTH)

    # 草圖18 → 填料-伸長11 (add)
    with BuildSketch(Plane.XY.offset(34)):
        Polygon((-17.584915638, -7.397890713), (-18.708735418, -10.179442277), (-18.152425106, -10.404206233), (-17.028605325, -7.622654669), align=None)
        Polygon((17.584915638, -7.397890713), (18.708735418, -10.179442277), (18.152425106, -10.404206233), (17.028605325, -7.622654669), align=None)
    extrude(amount=-EXTRUDE_11_DEPTH)

    # 草圖19 → 除料-伸長10 (cut, up to next)
    with BuildSketch(Plane.XZ.offset(17.549327991), mode=Mode.PRIVATE) as cut_extrude_10_sk1:
        with Locations(Location((-4.655345309, 30, 0), (0, 0, 270))):
            Circle(SKETCH_19_R)
    cut_extrude_10_tool1 = extrude(cut_extrude_10_sk1.sketch, amount=-CUT_EXTRUDE_10_REACH, mode=Mode.PRIVATE) & part.part
    # 草圖19 → 除料-伸長10 (cut, up to next)
    with BuildSketch(Plane.XZ.offset(17.549327991), mode=Mode.PRIVATE) as cut_extrude_10_sk2:
        with Locations(Location((4.655345309, 30, 0), (0, 0, 270))):
            Circle(SKETCH_19_R)
    cut_extrude_10_tool2 = extrude(cut_extrude_10_sk2.sketch, amount=-CUT_EXTRUDE_10_REACH, mode=Mode.PRIVATE) & part.part
    add(cut_extrude_10_tool1.solids().sort_by_distance((-4.655345, -17.549328, 30))[0], mode=Mode.SUBTRACT)
    add(cut_extrude_10_tool2.solids().sort_by_distance((4.655345, -17.549328, 30))[0], mode=Mode.SUBTRACT)

    # 草圖20 → 除料-伸長11 (cut, up to next)
    with BuildSketch(Plane.XY.offset(2), mode=Mode.PRIVATE) as cut_extrude_11_sk1:
        with Locations((-0.052549378, -2.199760856)):
            Rectangle(SKETCH_20_W, SKETCH_20_H)
    cut_extrude_11_tool1 = extrude(cut_extrude_11_sk1.sketch, amount=-CUT_EXTRUDE_11_REACH, mode=Mode.PRIVATE) & part.part
    add(cut_extrude_11_tool1.solids().sort_by_distance((-0.052549, -2.199761, 2))[0], mode=Mode.SUBTRACT)


solid = part.part
